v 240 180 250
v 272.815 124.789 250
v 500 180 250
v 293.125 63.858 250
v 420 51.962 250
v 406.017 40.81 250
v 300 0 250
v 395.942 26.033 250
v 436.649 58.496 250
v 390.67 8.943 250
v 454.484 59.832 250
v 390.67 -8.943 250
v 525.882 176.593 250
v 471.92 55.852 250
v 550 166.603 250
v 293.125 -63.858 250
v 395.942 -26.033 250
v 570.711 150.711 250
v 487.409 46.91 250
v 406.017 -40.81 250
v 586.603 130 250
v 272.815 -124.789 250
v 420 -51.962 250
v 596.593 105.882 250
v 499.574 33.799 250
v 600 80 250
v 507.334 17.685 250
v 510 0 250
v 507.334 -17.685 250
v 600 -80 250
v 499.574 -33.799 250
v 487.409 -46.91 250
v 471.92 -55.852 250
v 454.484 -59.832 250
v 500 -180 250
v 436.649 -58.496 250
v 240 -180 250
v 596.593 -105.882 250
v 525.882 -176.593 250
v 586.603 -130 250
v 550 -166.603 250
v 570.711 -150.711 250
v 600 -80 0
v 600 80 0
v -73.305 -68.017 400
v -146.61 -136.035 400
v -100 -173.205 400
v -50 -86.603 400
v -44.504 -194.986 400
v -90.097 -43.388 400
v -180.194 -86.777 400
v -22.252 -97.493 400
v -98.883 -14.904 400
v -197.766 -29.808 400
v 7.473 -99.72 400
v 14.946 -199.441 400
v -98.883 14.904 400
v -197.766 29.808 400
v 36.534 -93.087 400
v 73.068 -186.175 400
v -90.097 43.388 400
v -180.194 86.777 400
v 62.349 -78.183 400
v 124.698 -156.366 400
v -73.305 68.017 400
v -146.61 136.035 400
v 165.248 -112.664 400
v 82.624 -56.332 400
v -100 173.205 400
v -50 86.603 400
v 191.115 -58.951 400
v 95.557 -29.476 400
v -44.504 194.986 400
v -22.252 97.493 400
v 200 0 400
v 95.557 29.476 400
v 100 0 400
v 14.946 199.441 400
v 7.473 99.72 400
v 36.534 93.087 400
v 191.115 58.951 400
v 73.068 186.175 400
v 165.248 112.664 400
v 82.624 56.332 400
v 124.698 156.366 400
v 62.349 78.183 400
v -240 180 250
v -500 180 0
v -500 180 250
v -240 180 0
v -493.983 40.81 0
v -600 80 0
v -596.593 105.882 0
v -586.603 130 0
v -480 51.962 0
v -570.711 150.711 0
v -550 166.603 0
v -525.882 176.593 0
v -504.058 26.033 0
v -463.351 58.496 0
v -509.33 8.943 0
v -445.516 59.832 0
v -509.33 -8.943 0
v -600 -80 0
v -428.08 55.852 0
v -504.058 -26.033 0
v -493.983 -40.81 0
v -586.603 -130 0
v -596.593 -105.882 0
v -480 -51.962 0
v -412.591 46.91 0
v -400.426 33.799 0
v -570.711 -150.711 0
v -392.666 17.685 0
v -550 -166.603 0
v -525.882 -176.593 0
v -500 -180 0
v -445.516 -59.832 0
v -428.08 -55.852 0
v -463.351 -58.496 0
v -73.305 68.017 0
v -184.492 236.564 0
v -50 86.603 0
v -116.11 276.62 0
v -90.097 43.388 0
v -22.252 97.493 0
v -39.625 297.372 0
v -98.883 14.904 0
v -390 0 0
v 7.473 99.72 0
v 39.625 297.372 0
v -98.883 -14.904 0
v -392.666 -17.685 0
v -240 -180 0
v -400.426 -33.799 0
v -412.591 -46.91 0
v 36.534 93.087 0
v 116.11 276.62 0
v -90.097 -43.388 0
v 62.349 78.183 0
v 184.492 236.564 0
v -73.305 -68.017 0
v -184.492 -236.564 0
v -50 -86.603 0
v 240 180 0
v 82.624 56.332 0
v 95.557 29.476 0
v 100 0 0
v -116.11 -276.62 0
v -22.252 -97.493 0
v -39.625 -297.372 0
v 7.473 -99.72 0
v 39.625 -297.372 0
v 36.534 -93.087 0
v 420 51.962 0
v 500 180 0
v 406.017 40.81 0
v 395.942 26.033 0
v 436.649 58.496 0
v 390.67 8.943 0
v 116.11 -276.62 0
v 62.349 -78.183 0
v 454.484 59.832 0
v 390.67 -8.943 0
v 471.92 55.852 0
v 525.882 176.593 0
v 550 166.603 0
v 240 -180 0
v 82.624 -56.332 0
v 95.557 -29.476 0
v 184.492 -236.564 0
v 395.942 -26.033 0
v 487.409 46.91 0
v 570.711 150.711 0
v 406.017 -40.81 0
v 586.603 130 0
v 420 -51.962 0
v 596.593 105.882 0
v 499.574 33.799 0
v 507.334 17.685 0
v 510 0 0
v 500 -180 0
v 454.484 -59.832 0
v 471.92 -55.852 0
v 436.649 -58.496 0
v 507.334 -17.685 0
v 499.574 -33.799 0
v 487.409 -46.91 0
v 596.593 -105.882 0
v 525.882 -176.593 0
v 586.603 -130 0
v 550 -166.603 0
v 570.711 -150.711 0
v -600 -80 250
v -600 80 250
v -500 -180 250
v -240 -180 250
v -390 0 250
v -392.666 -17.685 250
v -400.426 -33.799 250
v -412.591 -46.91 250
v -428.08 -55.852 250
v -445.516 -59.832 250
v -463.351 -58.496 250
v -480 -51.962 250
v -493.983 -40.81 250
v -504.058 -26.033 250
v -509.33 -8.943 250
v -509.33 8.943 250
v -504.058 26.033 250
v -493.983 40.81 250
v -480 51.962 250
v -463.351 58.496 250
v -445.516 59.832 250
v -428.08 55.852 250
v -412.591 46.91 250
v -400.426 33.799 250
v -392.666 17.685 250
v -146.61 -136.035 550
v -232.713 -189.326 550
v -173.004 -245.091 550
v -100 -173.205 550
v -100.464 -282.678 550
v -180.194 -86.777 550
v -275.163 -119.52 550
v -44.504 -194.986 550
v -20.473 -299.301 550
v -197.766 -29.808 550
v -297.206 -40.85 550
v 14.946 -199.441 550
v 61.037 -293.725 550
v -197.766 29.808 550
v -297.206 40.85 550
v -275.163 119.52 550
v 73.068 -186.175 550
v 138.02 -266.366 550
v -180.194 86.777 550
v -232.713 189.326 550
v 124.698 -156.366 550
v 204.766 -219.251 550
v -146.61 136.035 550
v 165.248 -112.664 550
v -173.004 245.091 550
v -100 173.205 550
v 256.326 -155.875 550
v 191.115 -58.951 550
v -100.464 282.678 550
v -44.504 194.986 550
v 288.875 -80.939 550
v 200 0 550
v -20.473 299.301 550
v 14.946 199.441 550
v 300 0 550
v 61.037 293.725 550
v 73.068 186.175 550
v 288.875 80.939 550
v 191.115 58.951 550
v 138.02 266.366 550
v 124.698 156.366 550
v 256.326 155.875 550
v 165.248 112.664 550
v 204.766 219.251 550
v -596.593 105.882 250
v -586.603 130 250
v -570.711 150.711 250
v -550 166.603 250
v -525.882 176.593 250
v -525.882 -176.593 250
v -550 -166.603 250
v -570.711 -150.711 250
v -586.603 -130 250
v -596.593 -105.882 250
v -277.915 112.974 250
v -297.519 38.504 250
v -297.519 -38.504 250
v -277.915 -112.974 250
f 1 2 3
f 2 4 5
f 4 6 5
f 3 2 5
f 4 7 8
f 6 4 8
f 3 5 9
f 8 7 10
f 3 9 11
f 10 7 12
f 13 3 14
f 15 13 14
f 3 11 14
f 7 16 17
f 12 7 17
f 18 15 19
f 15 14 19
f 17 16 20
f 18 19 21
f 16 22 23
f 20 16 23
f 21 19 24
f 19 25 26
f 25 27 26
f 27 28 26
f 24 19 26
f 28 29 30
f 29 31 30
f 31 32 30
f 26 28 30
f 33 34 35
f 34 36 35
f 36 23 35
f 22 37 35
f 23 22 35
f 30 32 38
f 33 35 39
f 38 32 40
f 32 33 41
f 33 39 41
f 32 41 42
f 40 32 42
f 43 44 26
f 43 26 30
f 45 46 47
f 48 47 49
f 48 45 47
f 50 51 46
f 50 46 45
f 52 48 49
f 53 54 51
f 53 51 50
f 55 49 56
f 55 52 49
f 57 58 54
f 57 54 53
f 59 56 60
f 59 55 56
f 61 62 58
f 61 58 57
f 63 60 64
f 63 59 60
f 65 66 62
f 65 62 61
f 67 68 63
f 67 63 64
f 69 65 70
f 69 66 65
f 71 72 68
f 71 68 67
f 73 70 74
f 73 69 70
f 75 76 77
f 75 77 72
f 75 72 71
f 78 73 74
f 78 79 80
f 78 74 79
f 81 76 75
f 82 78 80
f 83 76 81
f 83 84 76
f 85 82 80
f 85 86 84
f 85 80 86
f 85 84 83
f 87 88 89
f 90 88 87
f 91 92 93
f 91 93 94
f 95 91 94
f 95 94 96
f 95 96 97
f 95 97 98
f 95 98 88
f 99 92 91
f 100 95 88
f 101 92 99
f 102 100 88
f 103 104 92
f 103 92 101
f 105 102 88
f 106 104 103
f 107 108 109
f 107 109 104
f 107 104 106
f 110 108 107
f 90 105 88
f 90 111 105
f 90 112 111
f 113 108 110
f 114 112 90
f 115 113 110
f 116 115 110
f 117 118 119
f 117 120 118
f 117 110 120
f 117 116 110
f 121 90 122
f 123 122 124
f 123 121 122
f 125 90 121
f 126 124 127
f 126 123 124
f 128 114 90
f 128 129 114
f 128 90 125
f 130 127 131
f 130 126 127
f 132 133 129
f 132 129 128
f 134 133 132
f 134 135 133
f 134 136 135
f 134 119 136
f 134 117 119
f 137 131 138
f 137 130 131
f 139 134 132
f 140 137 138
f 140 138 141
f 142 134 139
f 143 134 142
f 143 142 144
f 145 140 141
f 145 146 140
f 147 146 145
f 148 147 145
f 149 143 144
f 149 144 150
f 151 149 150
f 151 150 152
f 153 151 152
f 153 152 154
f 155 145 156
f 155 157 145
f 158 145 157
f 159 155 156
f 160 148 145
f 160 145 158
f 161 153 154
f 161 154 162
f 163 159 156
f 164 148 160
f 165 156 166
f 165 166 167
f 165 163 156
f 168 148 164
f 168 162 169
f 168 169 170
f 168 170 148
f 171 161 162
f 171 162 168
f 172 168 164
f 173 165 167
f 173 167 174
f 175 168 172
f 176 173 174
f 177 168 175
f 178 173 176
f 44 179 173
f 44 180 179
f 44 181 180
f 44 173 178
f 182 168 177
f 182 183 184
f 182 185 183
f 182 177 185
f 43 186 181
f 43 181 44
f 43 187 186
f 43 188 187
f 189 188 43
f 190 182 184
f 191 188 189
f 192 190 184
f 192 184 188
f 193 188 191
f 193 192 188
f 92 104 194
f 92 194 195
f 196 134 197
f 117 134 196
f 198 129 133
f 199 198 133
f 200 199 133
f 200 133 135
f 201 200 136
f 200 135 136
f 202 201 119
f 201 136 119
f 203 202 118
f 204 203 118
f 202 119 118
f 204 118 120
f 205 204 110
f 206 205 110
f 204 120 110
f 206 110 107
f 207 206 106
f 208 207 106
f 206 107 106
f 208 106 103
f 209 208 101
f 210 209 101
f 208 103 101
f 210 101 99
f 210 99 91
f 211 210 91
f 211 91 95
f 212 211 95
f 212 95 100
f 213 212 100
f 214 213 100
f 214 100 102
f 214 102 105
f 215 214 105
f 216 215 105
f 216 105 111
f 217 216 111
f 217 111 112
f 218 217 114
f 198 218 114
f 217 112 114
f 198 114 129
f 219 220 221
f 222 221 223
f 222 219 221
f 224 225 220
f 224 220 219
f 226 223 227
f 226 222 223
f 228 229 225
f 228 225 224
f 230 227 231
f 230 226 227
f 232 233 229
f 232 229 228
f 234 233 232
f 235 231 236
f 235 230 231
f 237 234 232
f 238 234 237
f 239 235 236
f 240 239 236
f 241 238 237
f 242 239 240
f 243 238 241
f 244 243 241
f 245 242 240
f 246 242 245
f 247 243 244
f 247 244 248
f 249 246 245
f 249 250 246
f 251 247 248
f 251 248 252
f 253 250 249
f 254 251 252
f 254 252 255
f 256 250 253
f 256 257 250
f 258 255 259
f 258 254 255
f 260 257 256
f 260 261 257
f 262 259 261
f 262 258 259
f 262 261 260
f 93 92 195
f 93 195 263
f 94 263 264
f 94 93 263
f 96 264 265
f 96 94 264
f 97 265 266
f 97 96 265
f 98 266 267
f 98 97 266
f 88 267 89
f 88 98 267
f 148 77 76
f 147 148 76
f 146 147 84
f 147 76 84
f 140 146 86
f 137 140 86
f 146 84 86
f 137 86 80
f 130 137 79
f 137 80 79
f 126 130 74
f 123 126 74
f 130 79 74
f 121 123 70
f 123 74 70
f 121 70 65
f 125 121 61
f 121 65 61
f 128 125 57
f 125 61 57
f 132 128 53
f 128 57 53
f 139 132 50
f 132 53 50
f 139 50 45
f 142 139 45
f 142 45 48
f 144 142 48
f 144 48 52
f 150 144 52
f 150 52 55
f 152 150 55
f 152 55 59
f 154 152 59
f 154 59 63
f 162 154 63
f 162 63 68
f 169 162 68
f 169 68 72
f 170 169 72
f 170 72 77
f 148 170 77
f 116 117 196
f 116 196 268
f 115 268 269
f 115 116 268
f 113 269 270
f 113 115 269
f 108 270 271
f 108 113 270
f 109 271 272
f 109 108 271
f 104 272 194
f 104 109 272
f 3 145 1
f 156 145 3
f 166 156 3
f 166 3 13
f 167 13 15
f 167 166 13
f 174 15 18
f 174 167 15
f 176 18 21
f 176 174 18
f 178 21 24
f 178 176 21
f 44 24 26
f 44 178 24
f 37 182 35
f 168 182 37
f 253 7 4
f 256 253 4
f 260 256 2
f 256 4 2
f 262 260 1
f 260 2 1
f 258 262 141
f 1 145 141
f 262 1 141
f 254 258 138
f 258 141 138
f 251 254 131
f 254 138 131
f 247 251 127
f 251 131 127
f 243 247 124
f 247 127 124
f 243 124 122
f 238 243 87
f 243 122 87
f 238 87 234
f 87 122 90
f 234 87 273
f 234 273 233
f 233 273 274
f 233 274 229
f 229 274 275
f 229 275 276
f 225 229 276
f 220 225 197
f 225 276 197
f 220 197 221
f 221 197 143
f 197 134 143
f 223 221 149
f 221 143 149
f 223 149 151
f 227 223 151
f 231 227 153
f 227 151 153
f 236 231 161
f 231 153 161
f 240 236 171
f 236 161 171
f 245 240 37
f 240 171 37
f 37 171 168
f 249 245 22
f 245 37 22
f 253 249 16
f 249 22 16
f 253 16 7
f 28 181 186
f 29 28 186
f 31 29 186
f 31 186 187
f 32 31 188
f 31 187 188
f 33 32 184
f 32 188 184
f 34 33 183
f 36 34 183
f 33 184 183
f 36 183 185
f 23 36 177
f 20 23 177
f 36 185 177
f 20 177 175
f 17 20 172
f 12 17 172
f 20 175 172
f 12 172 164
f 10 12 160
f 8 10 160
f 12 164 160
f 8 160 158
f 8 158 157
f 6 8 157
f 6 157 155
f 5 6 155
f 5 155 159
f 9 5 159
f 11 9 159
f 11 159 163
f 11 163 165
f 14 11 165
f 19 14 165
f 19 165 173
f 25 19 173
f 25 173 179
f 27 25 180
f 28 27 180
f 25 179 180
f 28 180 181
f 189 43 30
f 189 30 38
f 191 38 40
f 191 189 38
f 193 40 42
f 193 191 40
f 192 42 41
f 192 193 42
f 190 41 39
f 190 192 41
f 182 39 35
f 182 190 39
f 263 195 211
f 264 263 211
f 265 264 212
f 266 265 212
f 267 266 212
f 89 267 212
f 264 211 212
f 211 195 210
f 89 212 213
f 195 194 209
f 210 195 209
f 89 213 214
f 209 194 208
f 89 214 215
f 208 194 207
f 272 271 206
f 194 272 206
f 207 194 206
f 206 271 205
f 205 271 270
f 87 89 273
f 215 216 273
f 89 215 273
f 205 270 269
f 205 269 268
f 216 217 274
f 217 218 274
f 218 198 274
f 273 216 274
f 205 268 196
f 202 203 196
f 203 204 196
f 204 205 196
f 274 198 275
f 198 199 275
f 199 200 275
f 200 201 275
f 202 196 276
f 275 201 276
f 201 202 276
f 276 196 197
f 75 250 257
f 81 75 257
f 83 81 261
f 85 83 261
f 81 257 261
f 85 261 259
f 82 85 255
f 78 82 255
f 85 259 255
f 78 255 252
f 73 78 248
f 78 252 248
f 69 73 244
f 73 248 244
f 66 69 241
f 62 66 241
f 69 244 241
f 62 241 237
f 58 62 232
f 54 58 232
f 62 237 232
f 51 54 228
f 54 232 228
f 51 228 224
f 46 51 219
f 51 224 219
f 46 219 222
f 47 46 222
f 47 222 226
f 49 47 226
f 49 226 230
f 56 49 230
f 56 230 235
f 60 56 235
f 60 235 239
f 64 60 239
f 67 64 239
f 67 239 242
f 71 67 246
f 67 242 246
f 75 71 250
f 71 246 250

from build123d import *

# Parameters (mm, degrees)
F0_R     = 300
F1_DEPTH = 550
F2_R     = 200
F3_DEPTH = 150
F5_R     = 60
F6_DEPTH = 250
F4_R     = 100
F7_DEPTH = 400.001


with BuildPart() as f1:
    # F0 (on Top) → F1 (new body)
    with BuildSketch(Plane.XY):
        Circle(F0_R)
    extrude(amount=F1_DEPTH)

    # F2 (on face) → F3 (cut)
    with BuildSketch(Plane.XY.offset(550)):
        Circle(F2_R)
    extrude(amount=-F3_DEPTH, mode=Mode.SUBTRACT)

    # F5 (on face) → F6 (join)
    with BuildSketch(Plane(origin=(0, 0, 0), x_dir=(1, 0, 0), z_dir=(0, 0, -1))):
        with BuildLine():
            ThreePointArc((600, 80), (570.710678, 150.710678), (500, 180))
            Line((500, 180), (-500, 180))
            ThreePointArc((-500, 180), (-570.710678, 150.710678), (-600, 80))
            Line((-600, 80), (-600, -80))
            ThreePointArc((-600, -80), (-570.710678, -150.710678), (-500, -180))
            Line((-500, -180), (500, -180))
            ThreePointArc((500, -180), (570.710678, -150.710678), (600, -80))
            Line((600, -80), (600, 80))
        make_face()
        with Locations((-450, 0)):
            Circle(F5_R, mode=Mode.SUBTRACT)
        with Locations((450, 0)):
            Circle(F5_R, mode=Mode.SUBTRACT)
    extrude(amount=-F6_DEPTH)

    # F4 (on face) → F7 (cut, through all)
    with BuildSketch(Plane.XY.offset(400)):
        Circle(F4_R)
    extrude(amount=-F7_DEPTH, mode=Mode.SUBTRACT)


solid = f1.part
